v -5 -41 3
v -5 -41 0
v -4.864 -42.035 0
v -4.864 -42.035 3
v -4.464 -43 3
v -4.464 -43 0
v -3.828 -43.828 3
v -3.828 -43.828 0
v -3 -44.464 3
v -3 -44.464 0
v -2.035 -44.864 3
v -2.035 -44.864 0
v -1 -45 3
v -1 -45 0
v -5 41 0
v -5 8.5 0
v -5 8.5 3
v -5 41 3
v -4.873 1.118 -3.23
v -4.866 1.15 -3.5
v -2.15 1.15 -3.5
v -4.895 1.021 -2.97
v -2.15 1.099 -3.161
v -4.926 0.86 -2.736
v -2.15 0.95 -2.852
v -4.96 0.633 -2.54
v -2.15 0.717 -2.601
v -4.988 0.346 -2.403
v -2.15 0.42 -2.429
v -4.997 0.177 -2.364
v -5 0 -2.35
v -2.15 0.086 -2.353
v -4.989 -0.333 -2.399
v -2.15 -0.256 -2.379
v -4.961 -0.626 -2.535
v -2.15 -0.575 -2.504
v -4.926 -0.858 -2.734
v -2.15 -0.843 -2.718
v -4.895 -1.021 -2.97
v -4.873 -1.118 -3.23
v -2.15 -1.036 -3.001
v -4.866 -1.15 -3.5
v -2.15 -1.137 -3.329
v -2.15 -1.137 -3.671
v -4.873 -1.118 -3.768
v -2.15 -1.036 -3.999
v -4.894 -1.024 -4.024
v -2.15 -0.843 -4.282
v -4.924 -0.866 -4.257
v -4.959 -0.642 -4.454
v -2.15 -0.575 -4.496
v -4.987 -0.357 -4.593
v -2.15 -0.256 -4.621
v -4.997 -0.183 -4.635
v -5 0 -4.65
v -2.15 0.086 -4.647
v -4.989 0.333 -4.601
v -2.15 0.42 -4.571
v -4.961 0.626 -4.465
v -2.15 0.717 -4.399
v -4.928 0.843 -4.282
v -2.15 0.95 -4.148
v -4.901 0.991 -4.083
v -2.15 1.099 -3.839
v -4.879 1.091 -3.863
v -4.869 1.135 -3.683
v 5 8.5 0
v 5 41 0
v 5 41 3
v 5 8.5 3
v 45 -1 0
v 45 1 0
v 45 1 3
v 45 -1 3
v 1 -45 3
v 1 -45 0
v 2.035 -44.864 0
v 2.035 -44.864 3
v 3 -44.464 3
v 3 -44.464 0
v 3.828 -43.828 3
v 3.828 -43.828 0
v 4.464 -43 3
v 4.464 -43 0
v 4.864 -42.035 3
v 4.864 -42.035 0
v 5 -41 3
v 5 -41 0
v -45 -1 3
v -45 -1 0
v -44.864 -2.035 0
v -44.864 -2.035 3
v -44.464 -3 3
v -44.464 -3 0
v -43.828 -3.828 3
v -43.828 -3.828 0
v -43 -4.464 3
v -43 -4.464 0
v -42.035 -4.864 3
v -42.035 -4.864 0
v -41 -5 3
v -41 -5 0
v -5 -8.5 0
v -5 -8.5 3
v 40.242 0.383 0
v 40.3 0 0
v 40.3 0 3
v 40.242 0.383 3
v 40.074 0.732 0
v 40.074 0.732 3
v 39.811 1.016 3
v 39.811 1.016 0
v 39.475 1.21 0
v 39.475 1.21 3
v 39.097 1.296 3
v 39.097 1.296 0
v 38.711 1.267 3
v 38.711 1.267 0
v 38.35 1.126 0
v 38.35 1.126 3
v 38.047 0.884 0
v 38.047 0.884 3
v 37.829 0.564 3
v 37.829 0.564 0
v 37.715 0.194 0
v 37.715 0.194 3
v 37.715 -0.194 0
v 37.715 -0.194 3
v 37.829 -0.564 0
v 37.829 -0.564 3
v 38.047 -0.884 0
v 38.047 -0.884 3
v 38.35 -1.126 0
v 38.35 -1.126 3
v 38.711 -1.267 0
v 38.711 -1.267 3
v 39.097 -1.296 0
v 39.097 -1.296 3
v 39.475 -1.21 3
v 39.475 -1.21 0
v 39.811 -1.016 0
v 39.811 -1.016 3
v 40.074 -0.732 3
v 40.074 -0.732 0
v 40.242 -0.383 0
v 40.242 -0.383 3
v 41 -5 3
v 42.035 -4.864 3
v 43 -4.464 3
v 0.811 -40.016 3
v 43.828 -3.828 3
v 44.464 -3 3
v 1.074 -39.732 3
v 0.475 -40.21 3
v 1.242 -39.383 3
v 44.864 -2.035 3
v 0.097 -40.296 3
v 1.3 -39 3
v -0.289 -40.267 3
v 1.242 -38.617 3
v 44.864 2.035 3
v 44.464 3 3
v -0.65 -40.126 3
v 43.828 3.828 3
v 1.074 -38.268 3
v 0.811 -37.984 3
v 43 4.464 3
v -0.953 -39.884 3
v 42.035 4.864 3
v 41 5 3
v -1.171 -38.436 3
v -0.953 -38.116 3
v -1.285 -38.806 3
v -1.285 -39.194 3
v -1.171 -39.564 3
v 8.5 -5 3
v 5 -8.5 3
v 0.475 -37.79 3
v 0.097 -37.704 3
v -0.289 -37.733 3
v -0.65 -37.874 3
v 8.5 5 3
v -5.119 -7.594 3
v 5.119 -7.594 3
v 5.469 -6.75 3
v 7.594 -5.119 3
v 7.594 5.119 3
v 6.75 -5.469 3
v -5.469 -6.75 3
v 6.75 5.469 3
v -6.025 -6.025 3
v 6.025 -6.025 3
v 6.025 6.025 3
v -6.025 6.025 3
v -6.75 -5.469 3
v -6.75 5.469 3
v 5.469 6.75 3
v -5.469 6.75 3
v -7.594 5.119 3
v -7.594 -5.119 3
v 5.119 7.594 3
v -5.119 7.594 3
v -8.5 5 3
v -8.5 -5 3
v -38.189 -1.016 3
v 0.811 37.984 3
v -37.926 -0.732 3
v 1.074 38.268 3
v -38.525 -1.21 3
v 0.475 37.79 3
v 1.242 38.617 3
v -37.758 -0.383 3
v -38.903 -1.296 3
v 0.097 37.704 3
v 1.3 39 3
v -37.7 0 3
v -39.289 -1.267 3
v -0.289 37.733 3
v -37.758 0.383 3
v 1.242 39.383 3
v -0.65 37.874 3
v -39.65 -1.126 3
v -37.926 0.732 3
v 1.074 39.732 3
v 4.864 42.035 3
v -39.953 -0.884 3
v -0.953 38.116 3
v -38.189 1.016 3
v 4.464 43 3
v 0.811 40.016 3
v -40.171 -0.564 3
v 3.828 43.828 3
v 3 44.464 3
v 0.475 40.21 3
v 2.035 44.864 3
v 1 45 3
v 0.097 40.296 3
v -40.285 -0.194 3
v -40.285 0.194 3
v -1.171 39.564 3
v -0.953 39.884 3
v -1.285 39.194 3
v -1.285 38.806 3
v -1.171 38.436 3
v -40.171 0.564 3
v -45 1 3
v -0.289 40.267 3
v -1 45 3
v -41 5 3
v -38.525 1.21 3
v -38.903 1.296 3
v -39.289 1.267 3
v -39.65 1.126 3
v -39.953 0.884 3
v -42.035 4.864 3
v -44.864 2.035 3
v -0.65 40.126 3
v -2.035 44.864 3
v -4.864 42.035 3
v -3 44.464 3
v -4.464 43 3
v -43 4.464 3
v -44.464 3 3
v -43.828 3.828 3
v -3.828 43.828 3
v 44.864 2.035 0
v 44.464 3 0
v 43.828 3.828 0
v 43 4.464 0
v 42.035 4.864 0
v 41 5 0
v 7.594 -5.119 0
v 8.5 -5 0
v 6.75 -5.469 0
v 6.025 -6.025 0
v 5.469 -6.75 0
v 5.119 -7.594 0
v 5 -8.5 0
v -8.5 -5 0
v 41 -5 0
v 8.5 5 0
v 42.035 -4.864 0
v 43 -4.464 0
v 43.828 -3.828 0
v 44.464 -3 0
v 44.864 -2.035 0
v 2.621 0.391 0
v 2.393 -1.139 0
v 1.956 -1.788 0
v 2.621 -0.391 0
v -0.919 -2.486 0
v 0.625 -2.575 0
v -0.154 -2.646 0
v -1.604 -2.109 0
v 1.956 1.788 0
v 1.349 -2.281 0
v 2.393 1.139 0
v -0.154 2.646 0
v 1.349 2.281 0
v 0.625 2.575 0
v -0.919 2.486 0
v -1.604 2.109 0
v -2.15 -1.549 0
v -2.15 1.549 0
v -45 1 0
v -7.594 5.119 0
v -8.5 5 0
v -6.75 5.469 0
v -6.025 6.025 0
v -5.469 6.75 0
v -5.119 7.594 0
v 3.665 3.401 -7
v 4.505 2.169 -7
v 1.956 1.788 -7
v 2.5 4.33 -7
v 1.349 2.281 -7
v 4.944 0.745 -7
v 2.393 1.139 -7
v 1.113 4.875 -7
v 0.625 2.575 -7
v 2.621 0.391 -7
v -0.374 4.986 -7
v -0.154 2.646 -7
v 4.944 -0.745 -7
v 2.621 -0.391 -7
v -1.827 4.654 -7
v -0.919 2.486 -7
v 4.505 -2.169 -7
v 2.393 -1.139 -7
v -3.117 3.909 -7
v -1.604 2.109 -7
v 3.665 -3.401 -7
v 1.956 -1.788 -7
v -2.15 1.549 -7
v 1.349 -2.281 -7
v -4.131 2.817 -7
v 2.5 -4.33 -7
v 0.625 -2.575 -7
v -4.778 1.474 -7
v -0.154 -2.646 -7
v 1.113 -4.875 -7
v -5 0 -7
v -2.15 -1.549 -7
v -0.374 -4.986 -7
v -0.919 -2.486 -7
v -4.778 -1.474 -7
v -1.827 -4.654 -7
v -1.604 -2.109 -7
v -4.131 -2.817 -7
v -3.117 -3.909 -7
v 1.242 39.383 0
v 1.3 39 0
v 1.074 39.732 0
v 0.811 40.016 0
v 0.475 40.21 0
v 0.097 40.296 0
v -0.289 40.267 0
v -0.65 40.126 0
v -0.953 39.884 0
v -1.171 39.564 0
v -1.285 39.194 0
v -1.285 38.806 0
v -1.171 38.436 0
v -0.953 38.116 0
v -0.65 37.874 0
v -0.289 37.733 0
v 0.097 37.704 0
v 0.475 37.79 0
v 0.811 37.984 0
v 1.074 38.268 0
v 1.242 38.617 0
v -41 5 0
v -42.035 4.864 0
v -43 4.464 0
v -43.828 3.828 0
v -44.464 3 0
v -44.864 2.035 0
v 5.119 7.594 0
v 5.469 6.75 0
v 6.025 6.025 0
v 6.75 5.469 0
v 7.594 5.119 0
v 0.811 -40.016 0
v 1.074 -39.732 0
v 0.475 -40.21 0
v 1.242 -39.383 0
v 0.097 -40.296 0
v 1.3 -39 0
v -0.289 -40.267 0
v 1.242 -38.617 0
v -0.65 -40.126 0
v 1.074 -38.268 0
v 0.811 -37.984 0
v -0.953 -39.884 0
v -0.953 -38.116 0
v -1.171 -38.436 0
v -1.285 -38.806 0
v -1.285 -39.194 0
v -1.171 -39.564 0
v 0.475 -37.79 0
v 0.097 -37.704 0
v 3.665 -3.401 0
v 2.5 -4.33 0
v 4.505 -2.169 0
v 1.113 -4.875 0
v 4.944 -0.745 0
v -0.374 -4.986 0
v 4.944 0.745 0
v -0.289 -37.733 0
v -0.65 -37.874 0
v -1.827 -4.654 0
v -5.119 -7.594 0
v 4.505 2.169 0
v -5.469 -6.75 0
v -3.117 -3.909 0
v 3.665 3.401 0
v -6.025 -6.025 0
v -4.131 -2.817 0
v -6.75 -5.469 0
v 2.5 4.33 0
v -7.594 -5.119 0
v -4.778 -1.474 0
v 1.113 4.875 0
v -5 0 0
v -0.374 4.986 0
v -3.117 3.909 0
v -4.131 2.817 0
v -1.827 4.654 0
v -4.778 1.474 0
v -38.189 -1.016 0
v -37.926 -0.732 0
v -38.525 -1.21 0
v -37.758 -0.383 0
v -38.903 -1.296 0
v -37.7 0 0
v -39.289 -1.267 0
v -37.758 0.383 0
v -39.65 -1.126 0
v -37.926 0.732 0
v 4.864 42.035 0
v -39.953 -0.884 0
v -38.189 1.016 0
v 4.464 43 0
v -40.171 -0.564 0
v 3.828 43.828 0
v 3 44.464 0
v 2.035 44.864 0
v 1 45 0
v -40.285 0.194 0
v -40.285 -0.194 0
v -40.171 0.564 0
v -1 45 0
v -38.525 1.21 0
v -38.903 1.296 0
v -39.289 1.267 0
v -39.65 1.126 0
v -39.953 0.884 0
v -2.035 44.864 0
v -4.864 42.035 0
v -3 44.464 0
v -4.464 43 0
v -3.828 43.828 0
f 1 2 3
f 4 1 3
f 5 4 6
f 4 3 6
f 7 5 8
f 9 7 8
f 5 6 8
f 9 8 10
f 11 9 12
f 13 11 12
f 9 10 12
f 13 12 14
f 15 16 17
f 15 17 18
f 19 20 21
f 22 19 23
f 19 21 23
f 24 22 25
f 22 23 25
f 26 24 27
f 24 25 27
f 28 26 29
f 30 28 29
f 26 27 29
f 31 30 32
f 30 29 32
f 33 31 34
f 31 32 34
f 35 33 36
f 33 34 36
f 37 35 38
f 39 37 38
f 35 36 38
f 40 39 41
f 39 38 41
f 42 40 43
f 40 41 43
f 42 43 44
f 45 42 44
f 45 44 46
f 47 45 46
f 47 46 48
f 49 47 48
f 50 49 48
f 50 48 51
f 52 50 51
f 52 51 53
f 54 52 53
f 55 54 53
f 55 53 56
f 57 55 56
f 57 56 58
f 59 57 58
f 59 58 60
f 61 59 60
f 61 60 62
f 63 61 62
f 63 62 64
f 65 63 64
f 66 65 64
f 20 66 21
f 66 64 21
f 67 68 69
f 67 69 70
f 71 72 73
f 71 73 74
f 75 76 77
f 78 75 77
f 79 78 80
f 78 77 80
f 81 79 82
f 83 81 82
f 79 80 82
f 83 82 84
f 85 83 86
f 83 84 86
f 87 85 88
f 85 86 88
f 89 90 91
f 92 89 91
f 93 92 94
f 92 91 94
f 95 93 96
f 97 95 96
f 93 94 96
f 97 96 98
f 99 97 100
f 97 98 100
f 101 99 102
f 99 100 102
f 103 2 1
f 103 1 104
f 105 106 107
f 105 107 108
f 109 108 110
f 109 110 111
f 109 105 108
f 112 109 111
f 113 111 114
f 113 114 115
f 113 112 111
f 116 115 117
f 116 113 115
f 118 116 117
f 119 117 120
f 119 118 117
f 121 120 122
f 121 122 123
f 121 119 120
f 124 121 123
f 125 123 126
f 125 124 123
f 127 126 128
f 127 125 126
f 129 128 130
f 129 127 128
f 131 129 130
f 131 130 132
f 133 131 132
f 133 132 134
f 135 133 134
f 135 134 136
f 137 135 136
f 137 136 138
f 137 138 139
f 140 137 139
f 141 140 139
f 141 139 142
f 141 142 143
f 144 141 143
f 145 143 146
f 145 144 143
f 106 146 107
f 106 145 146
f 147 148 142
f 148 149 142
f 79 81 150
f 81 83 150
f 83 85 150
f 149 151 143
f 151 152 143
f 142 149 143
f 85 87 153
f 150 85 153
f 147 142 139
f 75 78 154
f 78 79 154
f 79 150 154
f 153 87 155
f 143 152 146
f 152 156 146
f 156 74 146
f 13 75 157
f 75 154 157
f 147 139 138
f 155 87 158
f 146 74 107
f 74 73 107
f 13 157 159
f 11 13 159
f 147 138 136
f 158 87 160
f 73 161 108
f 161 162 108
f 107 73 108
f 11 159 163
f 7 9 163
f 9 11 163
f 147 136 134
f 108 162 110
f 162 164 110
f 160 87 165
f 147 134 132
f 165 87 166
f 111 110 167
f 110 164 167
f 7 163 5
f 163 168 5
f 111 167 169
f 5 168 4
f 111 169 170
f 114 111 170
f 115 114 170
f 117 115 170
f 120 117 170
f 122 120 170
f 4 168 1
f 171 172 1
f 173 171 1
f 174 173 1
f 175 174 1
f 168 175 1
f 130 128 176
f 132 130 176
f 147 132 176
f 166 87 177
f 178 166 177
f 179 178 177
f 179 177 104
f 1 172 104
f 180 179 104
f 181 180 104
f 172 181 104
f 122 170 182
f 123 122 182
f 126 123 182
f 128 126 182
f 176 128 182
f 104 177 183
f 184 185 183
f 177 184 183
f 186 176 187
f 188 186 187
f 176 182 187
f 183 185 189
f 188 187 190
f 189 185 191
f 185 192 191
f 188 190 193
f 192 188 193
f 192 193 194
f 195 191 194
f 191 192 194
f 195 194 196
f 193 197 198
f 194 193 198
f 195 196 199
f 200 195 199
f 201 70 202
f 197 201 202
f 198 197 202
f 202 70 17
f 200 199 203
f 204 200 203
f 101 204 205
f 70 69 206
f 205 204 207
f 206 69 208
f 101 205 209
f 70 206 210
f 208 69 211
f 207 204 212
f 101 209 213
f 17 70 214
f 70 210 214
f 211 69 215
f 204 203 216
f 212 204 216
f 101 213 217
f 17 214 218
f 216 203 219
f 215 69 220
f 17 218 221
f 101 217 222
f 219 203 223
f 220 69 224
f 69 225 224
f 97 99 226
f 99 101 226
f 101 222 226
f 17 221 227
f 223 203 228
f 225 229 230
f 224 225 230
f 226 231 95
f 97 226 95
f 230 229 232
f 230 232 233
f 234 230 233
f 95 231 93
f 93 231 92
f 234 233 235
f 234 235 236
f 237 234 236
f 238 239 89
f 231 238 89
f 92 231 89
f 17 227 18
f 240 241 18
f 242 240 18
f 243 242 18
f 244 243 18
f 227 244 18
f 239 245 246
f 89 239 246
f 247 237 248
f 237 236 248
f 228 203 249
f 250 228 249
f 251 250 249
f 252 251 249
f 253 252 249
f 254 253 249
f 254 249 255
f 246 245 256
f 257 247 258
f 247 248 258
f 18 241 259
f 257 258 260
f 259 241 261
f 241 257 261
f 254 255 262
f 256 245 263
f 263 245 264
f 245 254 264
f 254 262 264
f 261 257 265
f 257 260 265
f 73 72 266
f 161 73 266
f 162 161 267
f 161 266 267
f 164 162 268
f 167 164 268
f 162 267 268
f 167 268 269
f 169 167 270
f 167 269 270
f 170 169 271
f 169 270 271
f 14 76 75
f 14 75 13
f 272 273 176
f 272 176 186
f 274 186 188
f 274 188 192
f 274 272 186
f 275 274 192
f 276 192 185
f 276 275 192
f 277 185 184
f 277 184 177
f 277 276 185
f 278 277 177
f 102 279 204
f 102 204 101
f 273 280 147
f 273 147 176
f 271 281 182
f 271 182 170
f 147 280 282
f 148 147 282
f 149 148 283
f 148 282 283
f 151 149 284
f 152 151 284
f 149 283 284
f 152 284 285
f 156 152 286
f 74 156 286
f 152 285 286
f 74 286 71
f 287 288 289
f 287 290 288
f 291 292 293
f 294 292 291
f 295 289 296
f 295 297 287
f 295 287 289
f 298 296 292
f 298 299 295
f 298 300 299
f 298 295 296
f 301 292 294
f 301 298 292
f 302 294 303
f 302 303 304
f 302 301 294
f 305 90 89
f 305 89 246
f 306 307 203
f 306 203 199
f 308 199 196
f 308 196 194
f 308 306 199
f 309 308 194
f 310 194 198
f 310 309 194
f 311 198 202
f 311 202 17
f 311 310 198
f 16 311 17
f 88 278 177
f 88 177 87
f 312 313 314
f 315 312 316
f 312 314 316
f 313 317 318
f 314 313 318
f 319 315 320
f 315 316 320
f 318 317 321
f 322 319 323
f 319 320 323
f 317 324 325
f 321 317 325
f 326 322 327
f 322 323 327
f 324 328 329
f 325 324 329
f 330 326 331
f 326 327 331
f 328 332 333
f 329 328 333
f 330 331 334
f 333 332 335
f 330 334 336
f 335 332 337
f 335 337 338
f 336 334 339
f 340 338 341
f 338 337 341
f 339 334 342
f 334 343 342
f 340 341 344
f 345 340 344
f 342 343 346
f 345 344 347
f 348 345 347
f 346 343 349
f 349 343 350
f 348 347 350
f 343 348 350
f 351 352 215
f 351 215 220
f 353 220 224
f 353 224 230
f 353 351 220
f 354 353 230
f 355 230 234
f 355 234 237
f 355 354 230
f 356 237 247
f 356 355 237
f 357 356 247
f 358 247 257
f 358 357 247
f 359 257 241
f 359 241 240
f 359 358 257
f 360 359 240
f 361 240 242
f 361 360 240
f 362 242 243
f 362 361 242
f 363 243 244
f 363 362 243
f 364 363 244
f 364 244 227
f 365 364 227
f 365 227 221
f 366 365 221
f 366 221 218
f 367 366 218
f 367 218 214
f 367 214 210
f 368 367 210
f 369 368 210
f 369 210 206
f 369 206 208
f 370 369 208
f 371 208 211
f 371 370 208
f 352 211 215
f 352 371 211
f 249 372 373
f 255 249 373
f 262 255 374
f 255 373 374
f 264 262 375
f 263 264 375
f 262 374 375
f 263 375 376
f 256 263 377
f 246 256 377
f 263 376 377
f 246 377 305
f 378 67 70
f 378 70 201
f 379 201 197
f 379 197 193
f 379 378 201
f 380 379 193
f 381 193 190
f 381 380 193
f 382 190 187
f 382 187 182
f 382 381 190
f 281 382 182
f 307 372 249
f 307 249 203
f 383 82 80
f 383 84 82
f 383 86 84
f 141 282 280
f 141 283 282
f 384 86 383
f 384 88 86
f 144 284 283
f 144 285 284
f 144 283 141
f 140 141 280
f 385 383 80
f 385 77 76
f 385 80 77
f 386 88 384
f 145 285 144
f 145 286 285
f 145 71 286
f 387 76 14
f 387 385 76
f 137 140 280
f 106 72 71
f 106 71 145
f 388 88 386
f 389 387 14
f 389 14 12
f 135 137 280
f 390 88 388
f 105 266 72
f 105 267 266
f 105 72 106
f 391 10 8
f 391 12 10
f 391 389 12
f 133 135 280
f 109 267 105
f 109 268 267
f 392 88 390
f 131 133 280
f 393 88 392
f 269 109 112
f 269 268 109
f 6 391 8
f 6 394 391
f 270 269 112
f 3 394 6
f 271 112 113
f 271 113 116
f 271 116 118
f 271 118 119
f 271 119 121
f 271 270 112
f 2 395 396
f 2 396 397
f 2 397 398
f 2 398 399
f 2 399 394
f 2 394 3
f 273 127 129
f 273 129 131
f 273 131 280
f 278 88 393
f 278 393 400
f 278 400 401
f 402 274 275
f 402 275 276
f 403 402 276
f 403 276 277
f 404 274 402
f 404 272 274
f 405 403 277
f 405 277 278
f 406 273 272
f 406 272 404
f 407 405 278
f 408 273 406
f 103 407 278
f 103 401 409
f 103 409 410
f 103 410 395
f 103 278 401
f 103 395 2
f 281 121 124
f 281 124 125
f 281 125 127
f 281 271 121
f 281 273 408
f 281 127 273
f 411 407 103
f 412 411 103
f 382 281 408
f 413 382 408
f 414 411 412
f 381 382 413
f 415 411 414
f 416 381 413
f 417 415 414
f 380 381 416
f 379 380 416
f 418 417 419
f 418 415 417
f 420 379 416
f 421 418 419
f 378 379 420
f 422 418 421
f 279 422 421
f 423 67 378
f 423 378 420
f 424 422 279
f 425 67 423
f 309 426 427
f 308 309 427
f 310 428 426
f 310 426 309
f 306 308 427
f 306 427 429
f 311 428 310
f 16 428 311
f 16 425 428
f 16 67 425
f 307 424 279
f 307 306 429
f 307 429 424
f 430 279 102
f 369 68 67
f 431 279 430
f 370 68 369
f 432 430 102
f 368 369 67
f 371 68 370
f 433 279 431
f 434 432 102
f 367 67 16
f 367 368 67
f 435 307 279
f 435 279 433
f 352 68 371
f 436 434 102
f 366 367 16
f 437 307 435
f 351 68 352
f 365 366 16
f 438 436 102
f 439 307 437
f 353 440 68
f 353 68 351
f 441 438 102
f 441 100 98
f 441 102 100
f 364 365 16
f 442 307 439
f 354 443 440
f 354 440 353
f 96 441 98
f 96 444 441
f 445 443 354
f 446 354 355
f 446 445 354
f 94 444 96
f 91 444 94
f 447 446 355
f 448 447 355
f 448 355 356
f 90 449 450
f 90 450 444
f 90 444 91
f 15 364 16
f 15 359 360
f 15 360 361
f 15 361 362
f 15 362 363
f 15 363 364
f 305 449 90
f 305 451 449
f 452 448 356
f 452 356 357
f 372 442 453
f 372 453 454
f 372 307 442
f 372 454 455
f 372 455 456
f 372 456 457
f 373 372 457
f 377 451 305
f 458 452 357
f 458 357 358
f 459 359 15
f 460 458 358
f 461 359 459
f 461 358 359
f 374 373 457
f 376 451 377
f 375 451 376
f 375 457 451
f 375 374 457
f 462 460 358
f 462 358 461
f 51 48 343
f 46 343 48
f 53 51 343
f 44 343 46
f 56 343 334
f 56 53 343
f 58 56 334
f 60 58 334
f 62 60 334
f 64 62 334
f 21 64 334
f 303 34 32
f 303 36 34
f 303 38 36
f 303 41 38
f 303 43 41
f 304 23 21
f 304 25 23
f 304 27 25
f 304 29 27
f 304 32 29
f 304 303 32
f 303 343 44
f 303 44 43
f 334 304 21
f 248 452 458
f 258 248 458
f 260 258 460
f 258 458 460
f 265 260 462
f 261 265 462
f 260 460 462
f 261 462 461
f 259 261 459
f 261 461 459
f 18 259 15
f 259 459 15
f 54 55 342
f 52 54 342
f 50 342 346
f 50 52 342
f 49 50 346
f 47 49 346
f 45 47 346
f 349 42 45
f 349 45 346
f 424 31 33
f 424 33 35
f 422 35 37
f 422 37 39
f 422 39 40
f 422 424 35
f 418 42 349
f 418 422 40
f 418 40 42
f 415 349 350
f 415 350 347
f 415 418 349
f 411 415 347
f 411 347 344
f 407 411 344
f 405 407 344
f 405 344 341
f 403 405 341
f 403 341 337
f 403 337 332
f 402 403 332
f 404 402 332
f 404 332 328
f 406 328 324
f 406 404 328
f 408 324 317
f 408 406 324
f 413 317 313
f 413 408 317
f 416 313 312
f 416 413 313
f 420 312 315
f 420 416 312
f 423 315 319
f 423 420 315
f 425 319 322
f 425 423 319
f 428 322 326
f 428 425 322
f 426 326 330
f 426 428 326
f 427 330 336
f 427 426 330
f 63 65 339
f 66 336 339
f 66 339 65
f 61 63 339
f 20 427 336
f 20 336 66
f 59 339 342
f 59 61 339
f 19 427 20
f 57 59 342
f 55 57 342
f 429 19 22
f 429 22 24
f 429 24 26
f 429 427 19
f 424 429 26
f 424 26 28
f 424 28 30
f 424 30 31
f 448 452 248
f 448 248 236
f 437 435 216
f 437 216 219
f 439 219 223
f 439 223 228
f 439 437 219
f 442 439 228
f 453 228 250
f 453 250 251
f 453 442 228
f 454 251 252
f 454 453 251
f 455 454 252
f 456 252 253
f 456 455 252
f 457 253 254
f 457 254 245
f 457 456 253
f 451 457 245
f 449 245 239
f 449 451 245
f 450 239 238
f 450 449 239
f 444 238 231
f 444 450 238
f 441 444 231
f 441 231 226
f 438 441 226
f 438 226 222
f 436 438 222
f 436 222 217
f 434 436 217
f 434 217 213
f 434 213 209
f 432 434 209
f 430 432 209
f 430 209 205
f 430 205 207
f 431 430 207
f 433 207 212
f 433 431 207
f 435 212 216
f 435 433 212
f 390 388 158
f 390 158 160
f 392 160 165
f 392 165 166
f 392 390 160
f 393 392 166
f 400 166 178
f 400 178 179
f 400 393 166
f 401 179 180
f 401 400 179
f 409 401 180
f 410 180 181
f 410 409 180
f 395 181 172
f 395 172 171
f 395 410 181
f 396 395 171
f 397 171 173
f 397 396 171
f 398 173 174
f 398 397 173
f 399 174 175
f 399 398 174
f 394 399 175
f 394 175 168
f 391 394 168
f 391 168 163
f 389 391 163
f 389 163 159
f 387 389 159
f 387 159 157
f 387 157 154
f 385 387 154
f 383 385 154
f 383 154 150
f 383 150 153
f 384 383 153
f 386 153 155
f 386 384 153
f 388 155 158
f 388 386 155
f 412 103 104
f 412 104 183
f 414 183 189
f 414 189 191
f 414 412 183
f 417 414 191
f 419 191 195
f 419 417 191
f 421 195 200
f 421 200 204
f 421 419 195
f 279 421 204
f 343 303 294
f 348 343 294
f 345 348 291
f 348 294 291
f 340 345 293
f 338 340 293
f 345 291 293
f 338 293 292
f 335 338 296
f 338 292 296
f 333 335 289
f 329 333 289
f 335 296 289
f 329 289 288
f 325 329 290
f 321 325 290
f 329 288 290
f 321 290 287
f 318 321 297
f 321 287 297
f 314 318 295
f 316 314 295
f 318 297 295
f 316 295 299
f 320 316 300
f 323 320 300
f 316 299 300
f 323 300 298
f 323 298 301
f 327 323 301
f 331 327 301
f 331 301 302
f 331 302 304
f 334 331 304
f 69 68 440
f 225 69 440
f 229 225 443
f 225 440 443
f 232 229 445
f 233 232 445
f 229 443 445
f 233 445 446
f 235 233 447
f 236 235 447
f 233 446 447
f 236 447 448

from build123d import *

# Parameters (mm, degrees)
SKETCH002_R  = 5
PAD002_DEPTH = 7
SKETCH_R     = 1.15
POCKET_DEPTH = 5
SKETCH003_R  = 1.3
PAD_DEPTH    = 3


with BuildPart() as part:
    # Sketch002 → Pad002 (new body)
    with BuildSketch(Plane(origin=(0, 0, 0), x_dir=(-1, 0, 0), z_dir=(0, 0, 1))):
        Circle(SKETCH002_R)
        with BuildLine():
            ThreePointArc((2.15, 1.549193), (-2.65, 0), (2.15, -1.549193))
            Line((2.15, 1.549193), (2.15, -1.549193))
        make_face(mode=Mode.SUBTRACT)
    extrude(amount=-PAD002_DEPTH)

    # Sketch → Pocket (cut)
    with BuildSketch(Plane(origin=(0, 0, -3.5), x_dir=(0, 1, 0), z_dir=(1, 0, 0))):
        Circle(SKETCH_R)
    extrude(amount=-POCKET_DEPTH, mode=Mode.SUBTRACT)

    # Sketch003 → Pad (join)
    with BuildSketch(Plane.XY):
        with BuildLine():
            Line((-41, 5), (-8.5, 5))
            ThreePointArc((-8.5, 5), (-6.025126, 6.025126), (-5, 8.5))
            Line((-5, 8.5), (-5, 41))
            ThreePointArc((-1, 45), (-3.828427, 43.828427), (-5, 41))
            Line((-1, 45), (1, 45))
            ThreePointArc((5, 41), (3.828427, 43.828427), (1, 45))
            Line((5, 41), (5, 8.5))
            ThreePointArc((5, 8.5), (6.025126, 6.025126), (8.5, 5))
            Line((8.5, 5), (41, 5))
            ThreePointArc((45, 1), (43.828427, 3.828427), (41, 5))
            Line((45, 1), (45, -1))
            ThreePointArc((41, -5), (43.828427, -3.828427), (45, -1))
            Line((41, -5), (8.5, -5))
            ThreePointArc((8.5, -5), (6.025126, -6.025126), (5, -8.5))
            Line((5, -8.5), (5, -41))
            ThreePointArc((1, -45), (3.828427, -43.828427), (5, -41))
            Line((1, -45), (-1, -45))
            ThreePointArc((-5, -41), (-3.828427, -43.828427), (-1, -45))
            Line((-5, -41), (-5, -8.5))
            ThreePointArc((-5, -8.5), (-6.025126, -6.025126), (-8.5, -5))
            Line((-8.5, -5), (-41, -5))
            ThreePointArc((-45, -1), (-43.828427, -3.828427), (-41, -5))
            Line((-45, -1), (-45, 1))
            ThreePointArc((-41, 5), (-43.828427, 3.828427), (-45, 1))
        make_face()
        with Locations((39, 0)):
            Circle(SKETCH003_R, mode=Mode.SUBTRACT)
        with Locations((-39, 0)):
            Circle(SKETCH003_R, mode=Mode.SUBTRACT)
        with Locations((0, 39)):
            Circle(SKETCH003_R, mode=Mode.SUBTRACT)
        with Locations((0, -39)):
            Circle(SKETCH003_R, mode=Mode.SUBTRACT)
    extrude(amount=PAD_DEPTH)


solid = part.part
